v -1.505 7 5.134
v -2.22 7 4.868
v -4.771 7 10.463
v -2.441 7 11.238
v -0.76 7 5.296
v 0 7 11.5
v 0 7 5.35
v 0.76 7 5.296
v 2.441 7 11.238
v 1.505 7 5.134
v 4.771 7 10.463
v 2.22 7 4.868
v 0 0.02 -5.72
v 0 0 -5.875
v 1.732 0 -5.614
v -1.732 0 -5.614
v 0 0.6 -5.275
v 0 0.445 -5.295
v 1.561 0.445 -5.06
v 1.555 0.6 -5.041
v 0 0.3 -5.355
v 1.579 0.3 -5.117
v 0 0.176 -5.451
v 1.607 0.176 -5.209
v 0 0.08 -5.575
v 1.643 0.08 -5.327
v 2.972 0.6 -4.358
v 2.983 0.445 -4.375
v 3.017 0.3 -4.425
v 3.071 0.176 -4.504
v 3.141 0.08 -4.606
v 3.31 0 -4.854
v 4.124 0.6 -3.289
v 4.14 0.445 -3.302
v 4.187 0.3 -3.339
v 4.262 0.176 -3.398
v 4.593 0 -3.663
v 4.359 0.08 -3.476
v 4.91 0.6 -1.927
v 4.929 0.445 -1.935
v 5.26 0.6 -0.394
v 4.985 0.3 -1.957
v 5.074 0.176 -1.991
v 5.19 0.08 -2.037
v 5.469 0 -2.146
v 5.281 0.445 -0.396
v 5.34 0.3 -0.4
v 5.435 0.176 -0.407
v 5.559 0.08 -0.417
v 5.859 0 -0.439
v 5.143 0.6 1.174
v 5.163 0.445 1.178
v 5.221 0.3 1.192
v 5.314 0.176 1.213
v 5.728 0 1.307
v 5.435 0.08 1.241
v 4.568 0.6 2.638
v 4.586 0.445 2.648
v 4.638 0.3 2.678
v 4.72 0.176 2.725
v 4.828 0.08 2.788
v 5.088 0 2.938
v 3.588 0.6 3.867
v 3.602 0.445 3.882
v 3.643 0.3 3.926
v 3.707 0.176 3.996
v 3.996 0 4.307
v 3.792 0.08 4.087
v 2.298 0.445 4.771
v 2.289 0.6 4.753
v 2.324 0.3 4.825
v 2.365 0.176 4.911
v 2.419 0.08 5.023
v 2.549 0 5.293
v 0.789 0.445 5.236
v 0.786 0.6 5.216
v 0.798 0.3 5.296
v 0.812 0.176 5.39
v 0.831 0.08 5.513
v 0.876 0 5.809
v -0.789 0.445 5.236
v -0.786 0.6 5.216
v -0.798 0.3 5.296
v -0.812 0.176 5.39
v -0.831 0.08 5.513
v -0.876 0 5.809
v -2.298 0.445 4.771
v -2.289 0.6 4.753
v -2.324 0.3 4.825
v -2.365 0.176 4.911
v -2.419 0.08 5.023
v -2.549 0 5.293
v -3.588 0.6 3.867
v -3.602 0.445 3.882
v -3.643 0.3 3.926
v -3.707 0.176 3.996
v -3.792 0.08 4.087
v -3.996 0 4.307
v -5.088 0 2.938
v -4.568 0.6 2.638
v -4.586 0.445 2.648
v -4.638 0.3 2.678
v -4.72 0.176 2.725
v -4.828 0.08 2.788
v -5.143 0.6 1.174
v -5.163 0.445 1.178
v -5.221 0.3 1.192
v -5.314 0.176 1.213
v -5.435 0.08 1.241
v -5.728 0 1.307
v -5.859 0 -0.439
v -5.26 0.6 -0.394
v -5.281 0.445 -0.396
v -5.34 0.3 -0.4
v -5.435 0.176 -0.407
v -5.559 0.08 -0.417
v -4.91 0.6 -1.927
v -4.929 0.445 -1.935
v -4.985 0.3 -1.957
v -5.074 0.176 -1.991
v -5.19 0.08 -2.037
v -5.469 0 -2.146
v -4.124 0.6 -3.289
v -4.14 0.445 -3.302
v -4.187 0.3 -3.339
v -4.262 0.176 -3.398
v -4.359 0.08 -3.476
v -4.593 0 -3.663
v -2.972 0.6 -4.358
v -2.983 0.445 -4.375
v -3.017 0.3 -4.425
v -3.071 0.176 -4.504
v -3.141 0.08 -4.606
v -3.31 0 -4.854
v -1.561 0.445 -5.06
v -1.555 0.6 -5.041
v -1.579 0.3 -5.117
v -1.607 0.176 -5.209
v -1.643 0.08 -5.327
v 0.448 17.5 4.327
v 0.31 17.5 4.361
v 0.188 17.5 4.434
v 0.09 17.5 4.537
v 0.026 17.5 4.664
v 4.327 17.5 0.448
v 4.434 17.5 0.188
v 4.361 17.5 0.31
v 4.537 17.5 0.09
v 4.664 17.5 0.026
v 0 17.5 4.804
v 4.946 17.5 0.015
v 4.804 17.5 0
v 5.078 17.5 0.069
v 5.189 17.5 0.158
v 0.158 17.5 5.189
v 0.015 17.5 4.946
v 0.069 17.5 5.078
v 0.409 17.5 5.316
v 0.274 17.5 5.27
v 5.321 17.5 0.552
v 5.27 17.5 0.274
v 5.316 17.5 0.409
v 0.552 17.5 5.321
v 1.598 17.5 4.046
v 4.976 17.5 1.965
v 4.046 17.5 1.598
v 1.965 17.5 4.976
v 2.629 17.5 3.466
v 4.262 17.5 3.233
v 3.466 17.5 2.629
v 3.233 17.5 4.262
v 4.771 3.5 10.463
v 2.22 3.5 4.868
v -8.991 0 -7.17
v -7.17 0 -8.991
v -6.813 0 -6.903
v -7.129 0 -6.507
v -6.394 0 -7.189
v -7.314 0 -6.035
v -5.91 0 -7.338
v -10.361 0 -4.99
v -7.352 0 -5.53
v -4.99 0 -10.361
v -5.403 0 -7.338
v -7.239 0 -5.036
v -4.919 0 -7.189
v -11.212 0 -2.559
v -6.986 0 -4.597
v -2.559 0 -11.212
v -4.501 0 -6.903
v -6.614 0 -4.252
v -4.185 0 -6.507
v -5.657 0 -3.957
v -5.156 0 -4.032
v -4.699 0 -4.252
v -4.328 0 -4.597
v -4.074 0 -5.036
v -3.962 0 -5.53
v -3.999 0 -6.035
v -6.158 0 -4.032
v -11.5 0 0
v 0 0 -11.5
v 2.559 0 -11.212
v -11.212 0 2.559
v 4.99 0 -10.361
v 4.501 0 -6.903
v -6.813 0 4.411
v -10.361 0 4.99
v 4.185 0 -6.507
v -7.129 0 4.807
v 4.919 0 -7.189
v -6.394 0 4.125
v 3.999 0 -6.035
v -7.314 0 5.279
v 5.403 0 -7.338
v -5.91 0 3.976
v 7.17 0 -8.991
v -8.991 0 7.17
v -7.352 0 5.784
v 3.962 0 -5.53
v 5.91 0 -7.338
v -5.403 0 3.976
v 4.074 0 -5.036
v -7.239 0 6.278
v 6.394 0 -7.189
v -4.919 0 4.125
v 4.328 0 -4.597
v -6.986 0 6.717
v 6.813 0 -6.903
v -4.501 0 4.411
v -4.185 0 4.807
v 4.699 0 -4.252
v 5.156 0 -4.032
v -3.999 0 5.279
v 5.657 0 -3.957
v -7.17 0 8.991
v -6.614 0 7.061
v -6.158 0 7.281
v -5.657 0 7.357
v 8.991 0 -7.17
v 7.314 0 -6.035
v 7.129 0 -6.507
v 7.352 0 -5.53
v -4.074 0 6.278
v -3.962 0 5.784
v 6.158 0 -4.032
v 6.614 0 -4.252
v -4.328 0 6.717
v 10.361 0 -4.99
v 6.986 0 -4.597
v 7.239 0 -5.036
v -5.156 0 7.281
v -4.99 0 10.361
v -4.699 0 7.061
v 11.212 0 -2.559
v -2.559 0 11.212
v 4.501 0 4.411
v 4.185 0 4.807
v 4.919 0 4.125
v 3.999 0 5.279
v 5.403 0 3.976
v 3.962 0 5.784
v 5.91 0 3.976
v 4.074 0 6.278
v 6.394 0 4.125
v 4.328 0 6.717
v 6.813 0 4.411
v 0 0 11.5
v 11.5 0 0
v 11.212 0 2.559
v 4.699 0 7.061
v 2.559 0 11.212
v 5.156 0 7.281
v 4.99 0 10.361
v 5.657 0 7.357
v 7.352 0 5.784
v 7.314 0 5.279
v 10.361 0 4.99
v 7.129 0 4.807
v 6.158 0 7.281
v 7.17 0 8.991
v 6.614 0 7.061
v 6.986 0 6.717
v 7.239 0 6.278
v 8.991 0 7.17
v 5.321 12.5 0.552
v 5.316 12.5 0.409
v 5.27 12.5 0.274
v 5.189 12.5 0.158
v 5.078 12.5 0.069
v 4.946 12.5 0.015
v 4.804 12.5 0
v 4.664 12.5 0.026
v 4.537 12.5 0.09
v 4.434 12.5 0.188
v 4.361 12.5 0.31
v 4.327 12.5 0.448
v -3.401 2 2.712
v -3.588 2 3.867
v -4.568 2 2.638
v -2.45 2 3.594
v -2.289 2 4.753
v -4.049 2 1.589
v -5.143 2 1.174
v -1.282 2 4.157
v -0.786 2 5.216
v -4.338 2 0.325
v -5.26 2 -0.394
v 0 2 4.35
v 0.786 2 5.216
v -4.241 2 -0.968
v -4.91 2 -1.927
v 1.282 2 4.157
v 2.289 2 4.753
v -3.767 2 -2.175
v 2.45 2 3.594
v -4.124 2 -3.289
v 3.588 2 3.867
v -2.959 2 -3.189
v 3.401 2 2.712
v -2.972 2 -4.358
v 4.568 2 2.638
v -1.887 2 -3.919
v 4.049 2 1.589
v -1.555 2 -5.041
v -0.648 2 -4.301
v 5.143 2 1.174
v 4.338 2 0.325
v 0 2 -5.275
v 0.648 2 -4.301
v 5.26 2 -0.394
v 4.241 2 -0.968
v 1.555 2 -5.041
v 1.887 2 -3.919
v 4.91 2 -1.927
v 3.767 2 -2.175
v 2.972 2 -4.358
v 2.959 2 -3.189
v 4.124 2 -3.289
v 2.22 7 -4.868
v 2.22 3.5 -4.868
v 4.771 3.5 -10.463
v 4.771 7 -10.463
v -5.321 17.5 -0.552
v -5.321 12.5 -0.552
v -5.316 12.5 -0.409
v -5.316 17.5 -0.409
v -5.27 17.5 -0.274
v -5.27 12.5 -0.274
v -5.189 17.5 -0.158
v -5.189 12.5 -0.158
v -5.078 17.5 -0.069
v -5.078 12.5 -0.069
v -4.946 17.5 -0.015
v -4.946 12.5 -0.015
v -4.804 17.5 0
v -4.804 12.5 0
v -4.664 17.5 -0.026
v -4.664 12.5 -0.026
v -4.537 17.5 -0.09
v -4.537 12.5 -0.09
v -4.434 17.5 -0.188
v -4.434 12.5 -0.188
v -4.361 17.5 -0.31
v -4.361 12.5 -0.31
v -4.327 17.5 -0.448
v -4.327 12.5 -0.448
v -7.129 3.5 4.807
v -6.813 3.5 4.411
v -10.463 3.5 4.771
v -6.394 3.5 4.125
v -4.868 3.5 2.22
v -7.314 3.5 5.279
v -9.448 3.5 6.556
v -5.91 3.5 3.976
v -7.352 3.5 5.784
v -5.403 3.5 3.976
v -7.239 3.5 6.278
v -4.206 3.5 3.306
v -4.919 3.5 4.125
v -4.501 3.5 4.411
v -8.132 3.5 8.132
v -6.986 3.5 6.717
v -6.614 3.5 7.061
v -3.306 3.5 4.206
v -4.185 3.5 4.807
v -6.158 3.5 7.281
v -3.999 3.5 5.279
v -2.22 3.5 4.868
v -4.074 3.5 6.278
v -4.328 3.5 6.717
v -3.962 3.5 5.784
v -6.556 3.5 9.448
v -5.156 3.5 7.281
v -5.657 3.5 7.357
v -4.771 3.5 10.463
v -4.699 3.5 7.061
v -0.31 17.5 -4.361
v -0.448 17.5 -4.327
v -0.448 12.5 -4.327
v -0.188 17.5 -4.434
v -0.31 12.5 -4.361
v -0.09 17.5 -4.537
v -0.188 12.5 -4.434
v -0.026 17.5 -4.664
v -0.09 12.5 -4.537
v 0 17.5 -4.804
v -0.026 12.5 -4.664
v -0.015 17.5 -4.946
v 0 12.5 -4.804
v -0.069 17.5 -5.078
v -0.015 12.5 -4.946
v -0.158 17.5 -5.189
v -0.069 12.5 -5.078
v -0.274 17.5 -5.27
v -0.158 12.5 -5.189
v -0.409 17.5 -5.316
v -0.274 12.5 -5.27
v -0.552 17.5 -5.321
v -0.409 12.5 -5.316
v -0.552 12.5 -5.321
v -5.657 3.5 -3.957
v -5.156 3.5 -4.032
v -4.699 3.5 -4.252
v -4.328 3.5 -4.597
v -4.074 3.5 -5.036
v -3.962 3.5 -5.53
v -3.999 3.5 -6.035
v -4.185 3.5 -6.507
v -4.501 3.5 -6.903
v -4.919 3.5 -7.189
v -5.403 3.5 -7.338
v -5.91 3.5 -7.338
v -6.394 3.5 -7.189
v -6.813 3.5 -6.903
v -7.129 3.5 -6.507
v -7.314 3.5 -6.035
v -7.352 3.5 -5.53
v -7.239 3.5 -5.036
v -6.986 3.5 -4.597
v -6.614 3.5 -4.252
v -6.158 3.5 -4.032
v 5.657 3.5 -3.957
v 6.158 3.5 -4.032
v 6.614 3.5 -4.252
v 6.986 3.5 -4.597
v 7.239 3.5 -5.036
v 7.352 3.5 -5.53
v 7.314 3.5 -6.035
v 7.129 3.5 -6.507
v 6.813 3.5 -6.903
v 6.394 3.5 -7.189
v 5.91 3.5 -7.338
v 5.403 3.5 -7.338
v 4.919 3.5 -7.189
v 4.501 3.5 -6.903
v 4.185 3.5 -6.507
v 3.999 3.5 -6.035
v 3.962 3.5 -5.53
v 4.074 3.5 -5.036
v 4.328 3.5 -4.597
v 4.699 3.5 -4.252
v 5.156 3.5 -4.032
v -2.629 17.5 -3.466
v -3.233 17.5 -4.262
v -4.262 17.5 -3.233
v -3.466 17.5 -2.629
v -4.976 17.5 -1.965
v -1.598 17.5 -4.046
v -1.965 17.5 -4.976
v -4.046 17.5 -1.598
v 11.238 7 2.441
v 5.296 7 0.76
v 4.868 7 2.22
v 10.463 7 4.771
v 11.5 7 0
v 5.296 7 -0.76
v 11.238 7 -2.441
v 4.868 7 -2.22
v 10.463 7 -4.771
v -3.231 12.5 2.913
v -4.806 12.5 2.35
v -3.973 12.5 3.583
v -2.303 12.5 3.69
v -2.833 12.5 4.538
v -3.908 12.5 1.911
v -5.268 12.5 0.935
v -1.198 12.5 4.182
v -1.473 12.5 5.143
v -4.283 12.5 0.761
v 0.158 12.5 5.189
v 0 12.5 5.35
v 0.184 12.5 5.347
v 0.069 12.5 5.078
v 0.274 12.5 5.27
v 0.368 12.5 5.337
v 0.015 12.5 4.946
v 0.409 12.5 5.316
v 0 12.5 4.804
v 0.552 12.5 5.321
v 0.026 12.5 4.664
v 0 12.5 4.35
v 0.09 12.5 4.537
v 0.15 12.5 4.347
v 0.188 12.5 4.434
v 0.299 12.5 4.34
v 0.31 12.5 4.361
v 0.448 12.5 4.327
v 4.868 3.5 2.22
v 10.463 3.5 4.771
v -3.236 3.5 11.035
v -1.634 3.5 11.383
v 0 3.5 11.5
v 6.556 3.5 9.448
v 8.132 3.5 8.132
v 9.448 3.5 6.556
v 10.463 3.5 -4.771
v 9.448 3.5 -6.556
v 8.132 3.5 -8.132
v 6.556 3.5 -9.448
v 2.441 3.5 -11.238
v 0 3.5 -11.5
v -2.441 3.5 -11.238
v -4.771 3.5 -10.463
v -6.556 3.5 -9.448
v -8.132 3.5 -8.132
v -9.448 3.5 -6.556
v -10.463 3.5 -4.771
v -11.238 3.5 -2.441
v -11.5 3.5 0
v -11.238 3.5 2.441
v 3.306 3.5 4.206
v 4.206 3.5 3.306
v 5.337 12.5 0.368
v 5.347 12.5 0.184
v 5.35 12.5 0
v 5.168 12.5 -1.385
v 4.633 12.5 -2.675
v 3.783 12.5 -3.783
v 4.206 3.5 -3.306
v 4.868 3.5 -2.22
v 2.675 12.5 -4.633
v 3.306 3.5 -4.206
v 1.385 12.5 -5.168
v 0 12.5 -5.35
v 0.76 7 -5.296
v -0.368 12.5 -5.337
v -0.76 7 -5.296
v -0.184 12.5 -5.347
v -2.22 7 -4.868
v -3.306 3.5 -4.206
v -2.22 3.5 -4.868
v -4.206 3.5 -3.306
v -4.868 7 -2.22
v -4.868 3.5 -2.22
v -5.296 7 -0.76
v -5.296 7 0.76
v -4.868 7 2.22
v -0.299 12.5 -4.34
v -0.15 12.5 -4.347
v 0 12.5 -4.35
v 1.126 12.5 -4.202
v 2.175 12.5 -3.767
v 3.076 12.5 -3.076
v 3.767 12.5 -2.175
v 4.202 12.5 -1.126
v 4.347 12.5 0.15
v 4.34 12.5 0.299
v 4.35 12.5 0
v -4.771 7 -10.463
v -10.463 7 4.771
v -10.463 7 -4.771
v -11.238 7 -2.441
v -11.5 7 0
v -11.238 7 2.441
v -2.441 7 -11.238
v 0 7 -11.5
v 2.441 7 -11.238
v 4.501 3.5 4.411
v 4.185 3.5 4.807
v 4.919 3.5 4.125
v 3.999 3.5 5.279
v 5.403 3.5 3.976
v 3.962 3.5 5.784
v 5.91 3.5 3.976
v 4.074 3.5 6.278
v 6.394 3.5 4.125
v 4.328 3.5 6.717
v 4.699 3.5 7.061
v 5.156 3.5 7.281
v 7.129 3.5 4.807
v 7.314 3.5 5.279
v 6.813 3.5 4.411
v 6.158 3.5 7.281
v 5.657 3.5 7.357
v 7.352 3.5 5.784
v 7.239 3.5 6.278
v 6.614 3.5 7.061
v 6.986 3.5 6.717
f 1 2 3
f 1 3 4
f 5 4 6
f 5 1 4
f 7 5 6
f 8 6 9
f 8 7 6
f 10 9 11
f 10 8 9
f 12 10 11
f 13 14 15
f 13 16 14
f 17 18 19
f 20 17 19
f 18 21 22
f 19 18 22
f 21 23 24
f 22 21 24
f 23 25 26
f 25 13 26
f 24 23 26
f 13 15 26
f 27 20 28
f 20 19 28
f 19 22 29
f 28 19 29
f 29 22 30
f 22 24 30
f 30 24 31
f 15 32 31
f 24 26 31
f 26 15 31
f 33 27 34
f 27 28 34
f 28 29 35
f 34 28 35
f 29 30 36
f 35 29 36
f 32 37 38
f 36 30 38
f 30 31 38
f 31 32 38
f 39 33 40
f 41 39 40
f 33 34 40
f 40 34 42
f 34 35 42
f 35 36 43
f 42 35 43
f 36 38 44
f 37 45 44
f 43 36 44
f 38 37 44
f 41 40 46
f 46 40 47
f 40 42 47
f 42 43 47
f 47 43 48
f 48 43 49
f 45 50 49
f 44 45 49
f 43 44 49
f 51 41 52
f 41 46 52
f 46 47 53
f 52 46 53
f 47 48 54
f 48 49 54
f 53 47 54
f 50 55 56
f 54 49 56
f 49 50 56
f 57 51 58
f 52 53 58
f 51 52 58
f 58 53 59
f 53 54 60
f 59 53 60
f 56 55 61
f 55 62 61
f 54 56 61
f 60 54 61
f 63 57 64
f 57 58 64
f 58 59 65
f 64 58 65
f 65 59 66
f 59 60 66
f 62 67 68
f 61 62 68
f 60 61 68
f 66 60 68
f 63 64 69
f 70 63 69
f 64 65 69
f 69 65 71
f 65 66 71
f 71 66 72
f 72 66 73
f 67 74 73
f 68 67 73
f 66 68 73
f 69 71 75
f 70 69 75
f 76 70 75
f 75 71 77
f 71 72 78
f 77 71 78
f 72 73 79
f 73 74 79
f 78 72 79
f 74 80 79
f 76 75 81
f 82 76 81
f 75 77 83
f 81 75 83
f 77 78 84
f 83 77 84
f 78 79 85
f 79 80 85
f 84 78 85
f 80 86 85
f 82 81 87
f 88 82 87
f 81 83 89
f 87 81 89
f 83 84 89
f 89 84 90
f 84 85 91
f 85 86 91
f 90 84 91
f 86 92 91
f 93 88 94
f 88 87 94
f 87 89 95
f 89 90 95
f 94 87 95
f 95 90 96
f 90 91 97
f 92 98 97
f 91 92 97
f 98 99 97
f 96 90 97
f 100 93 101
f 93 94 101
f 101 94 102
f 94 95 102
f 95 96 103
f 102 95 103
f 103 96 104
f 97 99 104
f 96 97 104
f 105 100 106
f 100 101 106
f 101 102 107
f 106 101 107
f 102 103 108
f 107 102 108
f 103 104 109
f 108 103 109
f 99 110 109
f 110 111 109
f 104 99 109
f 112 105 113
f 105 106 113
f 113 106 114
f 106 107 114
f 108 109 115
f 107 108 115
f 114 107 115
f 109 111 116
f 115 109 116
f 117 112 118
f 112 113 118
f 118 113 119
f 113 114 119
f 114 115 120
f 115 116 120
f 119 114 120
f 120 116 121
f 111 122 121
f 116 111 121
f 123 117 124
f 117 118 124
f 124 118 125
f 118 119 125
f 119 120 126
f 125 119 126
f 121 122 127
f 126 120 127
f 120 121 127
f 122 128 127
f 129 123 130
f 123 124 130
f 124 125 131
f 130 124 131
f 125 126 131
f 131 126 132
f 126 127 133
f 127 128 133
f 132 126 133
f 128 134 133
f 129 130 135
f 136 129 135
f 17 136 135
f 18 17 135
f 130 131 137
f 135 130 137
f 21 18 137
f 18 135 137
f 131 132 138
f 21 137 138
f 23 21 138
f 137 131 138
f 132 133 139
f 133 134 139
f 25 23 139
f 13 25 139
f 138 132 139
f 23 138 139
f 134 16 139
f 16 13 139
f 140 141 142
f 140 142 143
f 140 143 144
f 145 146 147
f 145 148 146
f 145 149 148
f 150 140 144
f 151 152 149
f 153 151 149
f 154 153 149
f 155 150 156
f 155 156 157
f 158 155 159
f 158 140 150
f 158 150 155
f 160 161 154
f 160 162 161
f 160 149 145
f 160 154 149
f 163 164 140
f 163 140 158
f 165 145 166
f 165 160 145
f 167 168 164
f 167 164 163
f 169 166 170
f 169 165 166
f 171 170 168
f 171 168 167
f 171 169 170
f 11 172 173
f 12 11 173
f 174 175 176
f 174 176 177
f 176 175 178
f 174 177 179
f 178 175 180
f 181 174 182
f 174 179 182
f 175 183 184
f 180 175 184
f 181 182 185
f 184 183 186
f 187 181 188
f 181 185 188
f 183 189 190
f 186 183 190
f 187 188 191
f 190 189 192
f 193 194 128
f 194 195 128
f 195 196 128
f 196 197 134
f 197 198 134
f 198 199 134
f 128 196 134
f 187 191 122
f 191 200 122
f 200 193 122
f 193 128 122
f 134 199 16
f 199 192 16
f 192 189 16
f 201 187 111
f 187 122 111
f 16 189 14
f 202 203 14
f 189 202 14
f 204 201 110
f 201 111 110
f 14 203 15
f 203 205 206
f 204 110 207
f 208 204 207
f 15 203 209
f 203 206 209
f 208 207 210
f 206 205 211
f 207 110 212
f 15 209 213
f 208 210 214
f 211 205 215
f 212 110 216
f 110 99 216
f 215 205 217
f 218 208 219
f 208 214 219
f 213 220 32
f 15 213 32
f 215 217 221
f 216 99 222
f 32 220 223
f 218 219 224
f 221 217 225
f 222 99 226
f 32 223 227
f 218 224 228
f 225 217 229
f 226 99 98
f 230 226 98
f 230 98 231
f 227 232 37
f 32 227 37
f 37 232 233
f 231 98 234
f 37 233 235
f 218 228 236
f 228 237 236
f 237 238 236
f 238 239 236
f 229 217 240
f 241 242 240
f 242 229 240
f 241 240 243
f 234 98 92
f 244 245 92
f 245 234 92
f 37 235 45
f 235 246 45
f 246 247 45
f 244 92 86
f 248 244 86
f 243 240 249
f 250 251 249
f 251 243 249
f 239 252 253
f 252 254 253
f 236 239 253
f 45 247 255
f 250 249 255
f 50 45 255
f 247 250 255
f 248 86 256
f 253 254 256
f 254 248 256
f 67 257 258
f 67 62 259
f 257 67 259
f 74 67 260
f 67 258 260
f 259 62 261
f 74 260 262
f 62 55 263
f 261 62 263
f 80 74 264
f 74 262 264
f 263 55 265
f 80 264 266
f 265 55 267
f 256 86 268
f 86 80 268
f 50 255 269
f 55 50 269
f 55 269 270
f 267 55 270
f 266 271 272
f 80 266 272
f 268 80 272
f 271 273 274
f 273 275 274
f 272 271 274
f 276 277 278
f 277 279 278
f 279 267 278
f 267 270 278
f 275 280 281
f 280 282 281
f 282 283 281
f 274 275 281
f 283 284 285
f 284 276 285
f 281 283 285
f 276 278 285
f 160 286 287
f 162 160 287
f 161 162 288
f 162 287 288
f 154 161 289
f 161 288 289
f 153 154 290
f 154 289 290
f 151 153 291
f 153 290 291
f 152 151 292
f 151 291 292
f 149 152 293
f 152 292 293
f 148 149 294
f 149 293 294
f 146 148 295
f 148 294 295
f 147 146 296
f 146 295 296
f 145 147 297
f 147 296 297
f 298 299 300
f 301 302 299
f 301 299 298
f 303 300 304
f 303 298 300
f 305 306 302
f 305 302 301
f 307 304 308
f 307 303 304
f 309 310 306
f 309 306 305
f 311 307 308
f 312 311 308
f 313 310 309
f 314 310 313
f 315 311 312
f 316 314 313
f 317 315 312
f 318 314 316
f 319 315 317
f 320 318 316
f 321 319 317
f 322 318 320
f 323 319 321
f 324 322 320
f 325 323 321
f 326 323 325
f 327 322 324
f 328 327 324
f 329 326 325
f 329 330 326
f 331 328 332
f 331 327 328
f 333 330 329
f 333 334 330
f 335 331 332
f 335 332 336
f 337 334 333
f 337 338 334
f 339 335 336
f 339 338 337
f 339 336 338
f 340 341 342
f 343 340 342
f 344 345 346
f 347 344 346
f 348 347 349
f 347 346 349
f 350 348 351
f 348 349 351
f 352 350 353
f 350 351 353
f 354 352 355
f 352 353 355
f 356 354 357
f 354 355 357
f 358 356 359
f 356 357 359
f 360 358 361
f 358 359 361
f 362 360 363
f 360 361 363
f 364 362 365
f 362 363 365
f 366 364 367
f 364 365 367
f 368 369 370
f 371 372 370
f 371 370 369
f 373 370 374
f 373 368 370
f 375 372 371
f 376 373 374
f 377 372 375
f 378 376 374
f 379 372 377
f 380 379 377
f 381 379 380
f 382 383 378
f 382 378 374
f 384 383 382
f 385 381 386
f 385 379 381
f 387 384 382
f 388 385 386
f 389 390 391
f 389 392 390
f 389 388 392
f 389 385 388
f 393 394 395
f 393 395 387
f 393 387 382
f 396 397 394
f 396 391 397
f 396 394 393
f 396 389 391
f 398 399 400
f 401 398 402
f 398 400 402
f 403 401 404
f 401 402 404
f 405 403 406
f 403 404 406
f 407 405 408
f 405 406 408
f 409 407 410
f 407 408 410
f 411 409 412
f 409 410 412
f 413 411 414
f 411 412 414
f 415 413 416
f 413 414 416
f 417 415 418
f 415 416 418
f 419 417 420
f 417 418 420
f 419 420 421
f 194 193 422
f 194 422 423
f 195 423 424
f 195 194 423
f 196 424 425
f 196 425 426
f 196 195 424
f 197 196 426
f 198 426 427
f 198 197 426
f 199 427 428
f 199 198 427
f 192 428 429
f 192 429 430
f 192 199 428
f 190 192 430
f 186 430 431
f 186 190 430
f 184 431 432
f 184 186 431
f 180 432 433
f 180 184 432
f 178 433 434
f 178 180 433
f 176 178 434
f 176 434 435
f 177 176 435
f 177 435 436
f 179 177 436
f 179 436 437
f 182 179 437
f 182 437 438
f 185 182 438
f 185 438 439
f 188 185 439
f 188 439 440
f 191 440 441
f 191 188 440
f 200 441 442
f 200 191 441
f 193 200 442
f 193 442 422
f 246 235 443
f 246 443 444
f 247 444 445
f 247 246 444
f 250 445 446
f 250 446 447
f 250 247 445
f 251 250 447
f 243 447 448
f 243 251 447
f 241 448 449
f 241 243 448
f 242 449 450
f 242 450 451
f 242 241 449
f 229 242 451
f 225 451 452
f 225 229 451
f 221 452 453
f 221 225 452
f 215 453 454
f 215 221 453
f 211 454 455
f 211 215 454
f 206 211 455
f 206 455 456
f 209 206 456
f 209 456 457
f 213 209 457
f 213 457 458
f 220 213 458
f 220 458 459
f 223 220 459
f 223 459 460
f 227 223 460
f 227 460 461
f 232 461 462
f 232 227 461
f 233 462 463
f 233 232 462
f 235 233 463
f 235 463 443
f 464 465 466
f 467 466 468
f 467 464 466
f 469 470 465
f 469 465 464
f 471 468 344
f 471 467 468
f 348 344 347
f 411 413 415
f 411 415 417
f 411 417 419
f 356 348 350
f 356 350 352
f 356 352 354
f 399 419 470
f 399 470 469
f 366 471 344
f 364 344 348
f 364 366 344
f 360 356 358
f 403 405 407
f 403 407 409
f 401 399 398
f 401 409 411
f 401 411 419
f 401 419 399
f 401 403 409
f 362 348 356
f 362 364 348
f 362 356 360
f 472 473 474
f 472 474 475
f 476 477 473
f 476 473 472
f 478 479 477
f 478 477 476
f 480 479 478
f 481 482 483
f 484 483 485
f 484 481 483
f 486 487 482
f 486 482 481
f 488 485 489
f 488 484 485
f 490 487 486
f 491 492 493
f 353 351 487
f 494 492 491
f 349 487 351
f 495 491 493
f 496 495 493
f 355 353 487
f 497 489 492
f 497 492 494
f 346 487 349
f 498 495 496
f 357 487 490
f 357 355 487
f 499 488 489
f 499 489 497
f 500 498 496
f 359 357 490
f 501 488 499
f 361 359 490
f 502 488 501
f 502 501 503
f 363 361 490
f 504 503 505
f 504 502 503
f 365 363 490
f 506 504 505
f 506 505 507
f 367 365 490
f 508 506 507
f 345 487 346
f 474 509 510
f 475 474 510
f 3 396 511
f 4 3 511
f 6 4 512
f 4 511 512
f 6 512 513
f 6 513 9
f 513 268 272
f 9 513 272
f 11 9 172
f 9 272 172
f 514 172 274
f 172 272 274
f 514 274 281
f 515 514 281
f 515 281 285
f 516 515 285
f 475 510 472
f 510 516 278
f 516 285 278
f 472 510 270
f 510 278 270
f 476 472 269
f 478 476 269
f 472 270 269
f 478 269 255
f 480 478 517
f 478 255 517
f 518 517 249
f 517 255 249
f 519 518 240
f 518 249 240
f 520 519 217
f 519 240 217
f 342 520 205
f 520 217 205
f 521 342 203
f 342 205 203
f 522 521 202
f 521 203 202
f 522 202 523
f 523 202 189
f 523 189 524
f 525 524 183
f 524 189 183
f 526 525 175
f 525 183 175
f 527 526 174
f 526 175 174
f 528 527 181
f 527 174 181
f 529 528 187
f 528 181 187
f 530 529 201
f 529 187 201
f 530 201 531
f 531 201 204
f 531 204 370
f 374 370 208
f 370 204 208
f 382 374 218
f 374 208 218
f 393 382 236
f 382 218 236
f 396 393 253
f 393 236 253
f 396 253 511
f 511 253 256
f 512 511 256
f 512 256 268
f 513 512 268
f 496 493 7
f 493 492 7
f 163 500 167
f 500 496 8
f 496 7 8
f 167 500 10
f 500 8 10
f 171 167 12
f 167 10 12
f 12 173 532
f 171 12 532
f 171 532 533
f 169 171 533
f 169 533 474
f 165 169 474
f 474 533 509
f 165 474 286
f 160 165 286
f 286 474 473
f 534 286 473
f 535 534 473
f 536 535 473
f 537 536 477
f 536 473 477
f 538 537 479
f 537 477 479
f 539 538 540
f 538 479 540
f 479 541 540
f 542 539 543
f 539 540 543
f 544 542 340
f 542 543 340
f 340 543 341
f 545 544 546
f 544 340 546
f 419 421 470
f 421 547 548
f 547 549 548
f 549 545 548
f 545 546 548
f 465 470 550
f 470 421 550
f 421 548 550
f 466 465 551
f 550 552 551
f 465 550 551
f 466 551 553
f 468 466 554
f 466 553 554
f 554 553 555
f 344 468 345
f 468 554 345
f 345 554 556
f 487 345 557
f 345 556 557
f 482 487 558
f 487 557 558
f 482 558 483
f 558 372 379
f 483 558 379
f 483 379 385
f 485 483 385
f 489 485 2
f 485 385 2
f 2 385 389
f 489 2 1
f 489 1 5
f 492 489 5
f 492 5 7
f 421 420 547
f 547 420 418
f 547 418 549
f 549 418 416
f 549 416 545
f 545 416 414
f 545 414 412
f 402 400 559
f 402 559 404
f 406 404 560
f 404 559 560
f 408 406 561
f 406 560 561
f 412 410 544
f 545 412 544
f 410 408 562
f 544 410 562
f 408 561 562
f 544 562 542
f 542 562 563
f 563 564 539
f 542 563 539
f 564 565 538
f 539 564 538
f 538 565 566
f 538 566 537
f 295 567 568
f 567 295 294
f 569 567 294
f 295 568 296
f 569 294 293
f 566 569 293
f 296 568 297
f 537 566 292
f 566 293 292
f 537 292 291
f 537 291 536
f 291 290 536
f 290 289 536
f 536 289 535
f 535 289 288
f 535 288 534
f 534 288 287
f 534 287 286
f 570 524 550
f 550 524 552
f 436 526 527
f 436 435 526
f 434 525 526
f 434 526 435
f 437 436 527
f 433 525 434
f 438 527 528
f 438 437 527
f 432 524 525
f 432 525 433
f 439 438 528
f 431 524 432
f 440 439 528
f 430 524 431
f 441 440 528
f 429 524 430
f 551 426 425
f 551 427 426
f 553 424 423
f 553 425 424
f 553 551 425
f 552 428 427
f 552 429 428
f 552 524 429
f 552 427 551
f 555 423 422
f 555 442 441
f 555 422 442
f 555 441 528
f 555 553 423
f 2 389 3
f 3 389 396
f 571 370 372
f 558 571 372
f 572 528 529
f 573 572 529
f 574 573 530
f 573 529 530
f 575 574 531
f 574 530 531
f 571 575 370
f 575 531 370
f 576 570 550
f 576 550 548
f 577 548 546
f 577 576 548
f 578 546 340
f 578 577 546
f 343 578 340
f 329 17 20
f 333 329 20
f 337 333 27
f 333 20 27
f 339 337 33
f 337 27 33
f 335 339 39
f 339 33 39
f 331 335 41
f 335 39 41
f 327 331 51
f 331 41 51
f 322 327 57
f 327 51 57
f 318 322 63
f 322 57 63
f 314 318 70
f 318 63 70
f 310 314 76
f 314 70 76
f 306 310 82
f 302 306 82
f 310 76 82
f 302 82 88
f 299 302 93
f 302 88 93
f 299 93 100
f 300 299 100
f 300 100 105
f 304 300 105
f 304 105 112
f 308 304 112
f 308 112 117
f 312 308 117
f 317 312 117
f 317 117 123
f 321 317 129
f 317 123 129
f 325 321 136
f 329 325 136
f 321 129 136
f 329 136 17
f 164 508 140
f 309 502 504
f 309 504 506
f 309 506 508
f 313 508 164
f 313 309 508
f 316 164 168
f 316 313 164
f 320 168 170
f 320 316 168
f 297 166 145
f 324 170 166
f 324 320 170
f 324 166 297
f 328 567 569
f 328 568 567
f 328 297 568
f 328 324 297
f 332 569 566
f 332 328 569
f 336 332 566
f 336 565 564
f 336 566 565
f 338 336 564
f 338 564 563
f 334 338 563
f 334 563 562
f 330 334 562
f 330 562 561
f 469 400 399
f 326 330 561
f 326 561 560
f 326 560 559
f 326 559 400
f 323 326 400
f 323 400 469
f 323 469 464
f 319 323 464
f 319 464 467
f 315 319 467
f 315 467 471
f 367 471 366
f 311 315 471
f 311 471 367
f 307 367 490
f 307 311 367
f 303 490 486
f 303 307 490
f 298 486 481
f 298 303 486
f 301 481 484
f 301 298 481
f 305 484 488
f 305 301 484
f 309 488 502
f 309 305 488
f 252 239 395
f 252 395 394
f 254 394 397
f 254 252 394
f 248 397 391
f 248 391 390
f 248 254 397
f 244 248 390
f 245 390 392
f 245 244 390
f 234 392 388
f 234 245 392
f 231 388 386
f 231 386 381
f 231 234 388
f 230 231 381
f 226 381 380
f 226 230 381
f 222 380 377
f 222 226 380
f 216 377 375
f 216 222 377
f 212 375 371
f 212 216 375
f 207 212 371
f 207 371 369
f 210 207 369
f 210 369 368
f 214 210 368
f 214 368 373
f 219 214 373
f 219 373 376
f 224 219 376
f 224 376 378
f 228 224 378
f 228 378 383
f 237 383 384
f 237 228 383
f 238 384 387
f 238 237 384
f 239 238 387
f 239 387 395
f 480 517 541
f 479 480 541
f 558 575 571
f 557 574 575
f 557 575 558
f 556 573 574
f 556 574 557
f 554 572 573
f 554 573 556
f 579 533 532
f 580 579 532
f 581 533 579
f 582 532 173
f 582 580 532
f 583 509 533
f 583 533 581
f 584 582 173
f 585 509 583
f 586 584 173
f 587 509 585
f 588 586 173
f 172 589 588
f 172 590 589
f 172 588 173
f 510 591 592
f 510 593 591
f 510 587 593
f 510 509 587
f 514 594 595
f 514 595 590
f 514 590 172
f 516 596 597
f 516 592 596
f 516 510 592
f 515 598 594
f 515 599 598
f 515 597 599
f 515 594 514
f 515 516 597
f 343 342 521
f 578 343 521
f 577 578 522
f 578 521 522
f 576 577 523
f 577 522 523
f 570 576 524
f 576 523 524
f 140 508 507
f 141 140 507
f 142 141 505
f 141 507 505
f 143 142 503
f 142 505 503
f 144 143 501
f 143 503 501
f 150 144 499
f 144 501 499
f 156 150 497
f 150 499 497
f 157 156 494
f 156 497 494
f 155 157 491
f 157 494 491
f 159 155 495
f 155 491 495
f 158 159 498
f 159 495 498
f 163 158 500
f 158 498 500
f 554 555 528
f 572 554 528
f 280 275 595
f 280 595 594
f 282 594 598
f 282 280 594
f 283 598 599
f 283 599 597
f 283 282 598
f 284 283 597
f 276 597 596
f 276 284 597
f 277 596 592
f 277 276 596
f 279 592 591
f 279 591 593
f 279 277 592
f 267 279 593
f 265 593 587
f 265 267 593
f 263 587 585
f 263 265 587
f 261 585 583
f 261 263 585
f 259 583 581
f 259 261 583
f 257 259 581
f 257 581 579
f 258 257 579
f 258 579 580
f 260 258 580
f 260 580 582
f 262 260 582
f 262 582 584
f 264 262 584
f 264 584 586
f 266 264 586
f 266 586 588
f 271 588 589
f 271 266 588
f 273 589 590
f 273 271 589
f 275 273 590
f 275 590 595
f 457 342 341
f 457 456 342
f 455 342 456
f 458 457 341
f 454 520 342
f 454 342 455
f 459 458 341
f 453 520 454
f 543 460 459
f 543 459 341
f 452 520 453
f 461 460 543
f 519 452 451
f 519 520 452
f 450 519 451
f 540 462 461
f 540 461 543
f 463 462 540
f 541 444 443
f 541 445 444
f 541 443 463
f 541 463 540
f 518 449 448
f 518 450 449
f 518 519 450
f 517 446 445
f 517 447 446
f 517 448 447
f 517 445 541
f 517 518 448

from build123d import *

# Parameters (mm, degrees)
CROQUIS1_R              = 11.5
CROQUIS1_R_2            = 4.35
CROQUIS1_R_3            = 1.7000000000000004
SALIENTE_EXTRUIR1_DEPTH = 3.5
CROQUIS2_R              = 5.35
CROQUIS2_R_2            = 4.35
SALIENTE_EXTRUIR2_DEPTH = 14
CORTAR_EXTRUIR1_START   = -5
CORTAR_EXTRUIR1_DEPTH   = 5
CROQUIS4_R              = 5.275
CROQUIS4_R_2            = 4.35
CORTAR_EXTRUIR2_DEPTH   = 2
REDONDEO1_R             = 0.6
REDONDEO2_R             = 0.5
SALIENTE_EXTRUIR3_DEPTH = 3.5


with BuildPart() as part:
    # Croquis1 → Saliente-Extruir1 (new body)
    with BuildSketch(Plane(origin=(0, 0, 0), x_dir=(1, 0, 0), z_dir=(0, 1, 0))):
        with Locations(Location((1.731948e-11, 0, 0), (0, 0, 270))):
            Circle(CROQUIS1_R)
        with Locations(Location((1.731948e-11, 0, 0), (0, 0, 270))):
            Circle(CROQUIS1_R_2, mode=Mode.SUBTRACT)
        with Locations(Location((5.656854249492441, 5.65685424949238, 0), (0, 0, 270))):
            Circle(CROQUIS1_R_3, mode=Mode.SUBTRACT)
        with Locations(Location((-5.656854249492318, 5.656854249492381, 0), (0, 0, 270))):
            Circle(CROQUIS1_R_3, mode=Mode.SUBTRACT)
        with Locations(Location((-5.656854249492318, -5.656854249492381, 0), (0, 0, 270))):
            Circle(CROQUIS1_R_3, mode=Mode.SUBTRACT)
        with Locations(Location((5.656854249492441, -5.65685424949238, 0), (0, 0, 270))):
            Circle(CROQUIS1_R_3, mode=Mode.SUBTRACT)
    extrude(amount=SALIENTE_EXTRUIR1_DEPTH)

    # Croquis2 → Saliente-Extruir2 (add)
    with BuildSketch(Plane(origin=(0, 3.5, 0), x_dir=(1, 0, 0), z_dir=(0, 1, 0))):
        with Locations(Location((1.731948e-11, 0, 0), (0, 0, 270))):
            Circle(CROQUIS2_R)
        with Locations(Location((1.731948e-11, 0, 0), (0, 0, 270))):
            Circle(CROQUIS2_R_2, mode=Mode.SUBTRACT)
    extrude(amount=SALIENTE_EXTRUIR2_DEPTH)

    # Croquis3 → Cortar-Extruir1 (cut)
    with BuildSketch(Plane(origin=(0, 17.5, 0), x_dir=(1, 0, 0), z_dir=(0, 1, 0)).offset(CORTAR_EXTRUIR1_START)):
        with BuildLine():
            Line((1.732086e-11, 5.35), (1.732072e-11, 4.35))
            ThreePointArc((1.732072e-11, 4.35), (3.0759144981543076, 3.0759144981369877), (4.34999999998268, 0))
            Line((4.34999999998268, 0), (5.34999999998268, 0))
            ThreePointArc((5.34999999998268, 0), (3.783021279340855, 3.783021279323535), (1.732086e-11, 5.35))
        make_face()
        with BuildLine():
            Line((1.732086e-11, -5.35), (1.732072e-11, -4.35))
            ThreePointArc((1.732072e-11, -4.35), (-3.075914498144163, -3.075914498161481), (-4.34999999998268, 0))
            Line((-4.34999999998268, 0), (-5.34999999998268, 0))
            ThreePointArc((-5.34999999998268, 0), (-3.7830212793307103, -3.7830212793480285), (1.732086e-11, -5.35))
        make_face()
    extrude(amount=CORTAR_EXTRUIR1_DEPTH, mode=Mode.SUBTRACT)

    # Croquis4 → Cortar-Extruir2 (cut)
    with BuildSketch(Plane.XZ):
        with Locations(Location((1.731948e-11, 0, 0), (0, 0, 270))):
            Circle(CROQUIS4_R)
        with Locations(Location((1.731948e-11, 0, 0), (0, 0, 270))):
            Circle(CROQUIS4_R_2, mode=Mode.SUBTRACT)
    extrude(amount=-CORTAR_EXTRUIR2_DEPTH, mode=Mode.SUBTRACT)

    # Redondeo1
    redondeo1_edges = [part.edges().sort_by_distance(p)[0] for p in [
        (1.732109e-11, 0, 5.275),
    ]]
    fillet(redondeo1_edges, radius=REDONDEO1_R)

    # Redondeo2
    # the kernel refuses this fillet: 0.5 mm, written as the material it takes off along each edge
    with BuildSketch(Plane(origin=(-4.34999999998268, 12.5, -2.1e-16), x_dir=(0.05161519234821224, 0, -0.9986670475783493), z_dir=(0, 1, 0))) as redondeo2_piece_1:
        with BuildLine():
            CenterArc((0.4748597696035476, 0.49933352378917434), REDONDEO2_R, 182.9586473758917, 84.08270524821648)
            Line((-0.02447375418562714, 0.4735259276150691), (0, 0))
            ThreePointArc((0, 0), (0.22452608671472166, 0.00579834303418057), (0.44905217342944187, 0))
        make_face()
    extrude(amount=6.185394894032285, mode=Mode.SUBTRACT)
    with BuildSketch(Plane(origin=(-5.34999999998268, 12.5, 0), x_dir=(1, 0, 0), z_dir=(0, 1, 0))) as redondeo2_piece_2:
        with BuildLine():
            CenterArc((0.5258420423870858, 0.5), REDONDEO2_R, 174.08270524821654, 95.91729475178346)
            ThreePointArc((0.02850617046822812, 0.5515463917525764), (0.00713129545583069, 0.27614127906293384), (0, 0))
            Line((0, 0), (0.5258420423870858, 0))
        make_face()
    extrude(amount=6.3807063953146645, mode=Mode.SUBTRACT)
    with BuildSketch(Plane(origin=(1.73185e-11, 12.5, 5.35), x_dir=(4.4e-15, 0, -1), z_dir=(0, 1, 0))) as redondeo2_piece_3:
        with BuildLine():
            CenterArc((0.5258420423870889, -0.5), REDONDEO2_R, 90.00000000000026, 95.91729475178363)
            ThreePointArc((0.02850617046823233, -0.5515463917525796), (0.0071312954558319, -0.27614127906293445), (0, 0))
            Line((0, 0), (0.5258420423870867, 0))
        make_face()
    extrude(amount=6.380706395314672, mode=Mode.SUBTRACT)
    with BuildSketch(Plane(origin=(1.731868e-11, 12.5, 4.35), x_dir=(0.9986670475783493, 0, -0.051615192348211894), z_dir=(0, 1, 0))) as redondeo2_piece_4:
        with BuildLine():
            CenterArc((0.474859769603551, -0.49933352378917434), REDONDEO2_R, 92.95864737589183, 84.08270524821639)
            Line((-0.0244737541856237, -0.4735259276150684), (0, 0))
            ThreePointArc((0, 0), (0.2245260867147224, -0.00579834303418053), (0.4490521734294448, 0))
        make_face()
    extrude(amount=6.185394894032285, mode=Mode.SUBTRACT)
    with BuildSketch(Plane(origin=(1.732072e-11, 12.5, -4.35), x_dir=(-0.9986670475783493, 0, 0.05161519234821218), z_dir=(0, 1, 0))) as redondeo2_piece_5:
        with BuildLine():
            CenterArc((0.474859769603548, -0.49933352378917434), REDONDEO2_R, 92.95864737589177, 84.08270524821641)
            Line((-0.02447375418562666, -0.47352592761506823), (0, 0))
            ThreePointArc((0, 0), (0.22452608671472019, -0.00579834303418048), (0.4490521734294423, 0))
        make_face()
    extrude(amount=6.185394894032285, mode=Mode.SUBTRACT)
    with BuildSketch(Plane(origin=(1.732103e-11, 12.5, -5.35), x_dir=(-4.2e-16, 0, 1), z_dir=(0, 1, 0))) as redondeo2_piece_6:
        with BuildLine():
            CenterArc((0.525842042387086, -0.5), REDONDEO2_R, 90.00000000000003, 95.91729475178352)
            ThreePointArc((0.02850617046822835, -0.5515463917525767), (0.00713129545583081, -0.27614127906293173), (0, 0))
            Line((0, 0), (0.5258420423870858, 0))
        make_face()
    extrude(amount=6.3807063953146645, mode=Mode.SUBTRACT)
    with BuildSketch(Plane(origin=(4.34999999998268, 12.5, 1.9e-16), x_dir=(-0.05161519227127975, 0, 0.9986670475823255), z_dir=(0, 1, 0))) as redondeo2_piece_7:
        with BuildLine():
            CenterArc((0.47485976964022647, 0.4993335237871862), REDONDEO2_R, 182.95864737147792, 84.08270524821648)
            Line((-0.02447375415093636, 0.4735259276515472), (0, 0))
            ThreePointArc((0, 0), (0.22452608671427532, 0.00579834305147695), (0.44905217342765447, 0))
        make_face()
    extrude(amount=6.1853948941188825, mode=Mode.SUBTRACT)
    with BuildSketch(Plane(origin=(5.34999999998268, 12.5, 0), x_dir=(-1, 0, 0), z_dir=(0, 1, 0))) as redondeo2_piece_8:
        with BuildLine():
            CenterArc((0.5258420423524468, 0.5), REDONDEO2_R, 174.08270524821646, 95.91729475178352)
            ThreePointArc((0.02850617043359005, 0.5515463917525769), (0.0071312954212388, 0.2761412790638265), (0, 0))
            Line((0, 0), (0.5258420423524468, 0))
        make_face()
    extrude(amount=6.380706395310195, mode=Mode.SUBTRACT)

    # Croquis5 → Saliente-Extruir3 (add)
    with BuildSketch(Plane(origin=(0, 3.5, 0), x_dir=(1, 0, 0), z_dir=(0, 1, 0))):
        with BuildLine():
            Line((-4.867801495370659, 2.219686599837588), (-10.46349854147086, 4.7712889529219185))
            ThreePointArc((-10.46349854147086, 4.7712889529219185), (-11.49999999998268, 1.41e-15), (-10.46349854147086, -4.771288952921916))
            Line((-10.46349854147086, -4.771288952921914), (-4.86780149537066, -2.219686599837586))
            ThreePointArc((-4.86780149537066, -2.219686599837586), (-5.34999999998268, 8.9e-16), (-4.86780149537066, 2.219686599837588))
        make_face()
        with BuildLine():
            Line((-2.2196865998351183, -4.867801495381207), (-4.77128895293652, -10.463498541473625))
            ThreePointArc((-4.771288952936522, -10.463498541473623), (-6.77758e-12, -11.5), (4.771288952927311, -10.463498541493617))
            Line((4.771288952927309, -10.46349854149362), (2.2196865998493576, -4.86780149539051))
            ThreePointArc((2.219686599849358, -4.867801495390509), (6.10956e-12, -5.35), (-2.219686599835118, -4.867801495381206))
        make_face()
        with BuildLine():
            ThreePointArc((11.50000000001732, 0), (11.237887551221265, 2.4412872396535783), (10.463498541496383, 4.771288952941911))
            Line((10.463498541496381, 4.7712889529419105), (4.867801495401058, 2.2196865998468893))
            ThreePointArc((4.867801495401059, 2.2196865998468898), (5.228060730360026, 1.1357292810562294), (5.350000000017321, -1.1e-16))
            ThreePointArc((5.350000000017321, -1.1e-16), (5.228060730360026, -1.1357292810562303), (4.867801495401057, -2.2196865998468898))
            Line((4.867801495401058, -2.2196865998468898), (10.463498541496381, -4.771288952941912))
            ThreePointArc((10.463498541496378, -4.7712889529419185), (11.237887551221265, -2.4412872396535787), (11.50000000001732, -2.82e-15))
        make_face()
        with BuildLine():
            ThreePointArc((4.771288952927309, 10.46349854149362), (-6.77732e-12, 11.5), (-4.771288952936519, 10.463498541473625))
            Line((-4.771288952936519, 10.463498541473623), (-2.2196865998351187, 4.867801495381207))
            ThreePointArc((-2.219686599835118, 4.867801495381207), (6.10867e-12, 5.35), (2.219686599849357, 4.86780149539051))
            Line((2.2196865998493576, 4.86780149539051), (4.771288952927309, 10.46349854149362))
        make_face()
    extrude(amount=SALIENTE_EXTRUIR3_DEPTH)


solid = part.part
